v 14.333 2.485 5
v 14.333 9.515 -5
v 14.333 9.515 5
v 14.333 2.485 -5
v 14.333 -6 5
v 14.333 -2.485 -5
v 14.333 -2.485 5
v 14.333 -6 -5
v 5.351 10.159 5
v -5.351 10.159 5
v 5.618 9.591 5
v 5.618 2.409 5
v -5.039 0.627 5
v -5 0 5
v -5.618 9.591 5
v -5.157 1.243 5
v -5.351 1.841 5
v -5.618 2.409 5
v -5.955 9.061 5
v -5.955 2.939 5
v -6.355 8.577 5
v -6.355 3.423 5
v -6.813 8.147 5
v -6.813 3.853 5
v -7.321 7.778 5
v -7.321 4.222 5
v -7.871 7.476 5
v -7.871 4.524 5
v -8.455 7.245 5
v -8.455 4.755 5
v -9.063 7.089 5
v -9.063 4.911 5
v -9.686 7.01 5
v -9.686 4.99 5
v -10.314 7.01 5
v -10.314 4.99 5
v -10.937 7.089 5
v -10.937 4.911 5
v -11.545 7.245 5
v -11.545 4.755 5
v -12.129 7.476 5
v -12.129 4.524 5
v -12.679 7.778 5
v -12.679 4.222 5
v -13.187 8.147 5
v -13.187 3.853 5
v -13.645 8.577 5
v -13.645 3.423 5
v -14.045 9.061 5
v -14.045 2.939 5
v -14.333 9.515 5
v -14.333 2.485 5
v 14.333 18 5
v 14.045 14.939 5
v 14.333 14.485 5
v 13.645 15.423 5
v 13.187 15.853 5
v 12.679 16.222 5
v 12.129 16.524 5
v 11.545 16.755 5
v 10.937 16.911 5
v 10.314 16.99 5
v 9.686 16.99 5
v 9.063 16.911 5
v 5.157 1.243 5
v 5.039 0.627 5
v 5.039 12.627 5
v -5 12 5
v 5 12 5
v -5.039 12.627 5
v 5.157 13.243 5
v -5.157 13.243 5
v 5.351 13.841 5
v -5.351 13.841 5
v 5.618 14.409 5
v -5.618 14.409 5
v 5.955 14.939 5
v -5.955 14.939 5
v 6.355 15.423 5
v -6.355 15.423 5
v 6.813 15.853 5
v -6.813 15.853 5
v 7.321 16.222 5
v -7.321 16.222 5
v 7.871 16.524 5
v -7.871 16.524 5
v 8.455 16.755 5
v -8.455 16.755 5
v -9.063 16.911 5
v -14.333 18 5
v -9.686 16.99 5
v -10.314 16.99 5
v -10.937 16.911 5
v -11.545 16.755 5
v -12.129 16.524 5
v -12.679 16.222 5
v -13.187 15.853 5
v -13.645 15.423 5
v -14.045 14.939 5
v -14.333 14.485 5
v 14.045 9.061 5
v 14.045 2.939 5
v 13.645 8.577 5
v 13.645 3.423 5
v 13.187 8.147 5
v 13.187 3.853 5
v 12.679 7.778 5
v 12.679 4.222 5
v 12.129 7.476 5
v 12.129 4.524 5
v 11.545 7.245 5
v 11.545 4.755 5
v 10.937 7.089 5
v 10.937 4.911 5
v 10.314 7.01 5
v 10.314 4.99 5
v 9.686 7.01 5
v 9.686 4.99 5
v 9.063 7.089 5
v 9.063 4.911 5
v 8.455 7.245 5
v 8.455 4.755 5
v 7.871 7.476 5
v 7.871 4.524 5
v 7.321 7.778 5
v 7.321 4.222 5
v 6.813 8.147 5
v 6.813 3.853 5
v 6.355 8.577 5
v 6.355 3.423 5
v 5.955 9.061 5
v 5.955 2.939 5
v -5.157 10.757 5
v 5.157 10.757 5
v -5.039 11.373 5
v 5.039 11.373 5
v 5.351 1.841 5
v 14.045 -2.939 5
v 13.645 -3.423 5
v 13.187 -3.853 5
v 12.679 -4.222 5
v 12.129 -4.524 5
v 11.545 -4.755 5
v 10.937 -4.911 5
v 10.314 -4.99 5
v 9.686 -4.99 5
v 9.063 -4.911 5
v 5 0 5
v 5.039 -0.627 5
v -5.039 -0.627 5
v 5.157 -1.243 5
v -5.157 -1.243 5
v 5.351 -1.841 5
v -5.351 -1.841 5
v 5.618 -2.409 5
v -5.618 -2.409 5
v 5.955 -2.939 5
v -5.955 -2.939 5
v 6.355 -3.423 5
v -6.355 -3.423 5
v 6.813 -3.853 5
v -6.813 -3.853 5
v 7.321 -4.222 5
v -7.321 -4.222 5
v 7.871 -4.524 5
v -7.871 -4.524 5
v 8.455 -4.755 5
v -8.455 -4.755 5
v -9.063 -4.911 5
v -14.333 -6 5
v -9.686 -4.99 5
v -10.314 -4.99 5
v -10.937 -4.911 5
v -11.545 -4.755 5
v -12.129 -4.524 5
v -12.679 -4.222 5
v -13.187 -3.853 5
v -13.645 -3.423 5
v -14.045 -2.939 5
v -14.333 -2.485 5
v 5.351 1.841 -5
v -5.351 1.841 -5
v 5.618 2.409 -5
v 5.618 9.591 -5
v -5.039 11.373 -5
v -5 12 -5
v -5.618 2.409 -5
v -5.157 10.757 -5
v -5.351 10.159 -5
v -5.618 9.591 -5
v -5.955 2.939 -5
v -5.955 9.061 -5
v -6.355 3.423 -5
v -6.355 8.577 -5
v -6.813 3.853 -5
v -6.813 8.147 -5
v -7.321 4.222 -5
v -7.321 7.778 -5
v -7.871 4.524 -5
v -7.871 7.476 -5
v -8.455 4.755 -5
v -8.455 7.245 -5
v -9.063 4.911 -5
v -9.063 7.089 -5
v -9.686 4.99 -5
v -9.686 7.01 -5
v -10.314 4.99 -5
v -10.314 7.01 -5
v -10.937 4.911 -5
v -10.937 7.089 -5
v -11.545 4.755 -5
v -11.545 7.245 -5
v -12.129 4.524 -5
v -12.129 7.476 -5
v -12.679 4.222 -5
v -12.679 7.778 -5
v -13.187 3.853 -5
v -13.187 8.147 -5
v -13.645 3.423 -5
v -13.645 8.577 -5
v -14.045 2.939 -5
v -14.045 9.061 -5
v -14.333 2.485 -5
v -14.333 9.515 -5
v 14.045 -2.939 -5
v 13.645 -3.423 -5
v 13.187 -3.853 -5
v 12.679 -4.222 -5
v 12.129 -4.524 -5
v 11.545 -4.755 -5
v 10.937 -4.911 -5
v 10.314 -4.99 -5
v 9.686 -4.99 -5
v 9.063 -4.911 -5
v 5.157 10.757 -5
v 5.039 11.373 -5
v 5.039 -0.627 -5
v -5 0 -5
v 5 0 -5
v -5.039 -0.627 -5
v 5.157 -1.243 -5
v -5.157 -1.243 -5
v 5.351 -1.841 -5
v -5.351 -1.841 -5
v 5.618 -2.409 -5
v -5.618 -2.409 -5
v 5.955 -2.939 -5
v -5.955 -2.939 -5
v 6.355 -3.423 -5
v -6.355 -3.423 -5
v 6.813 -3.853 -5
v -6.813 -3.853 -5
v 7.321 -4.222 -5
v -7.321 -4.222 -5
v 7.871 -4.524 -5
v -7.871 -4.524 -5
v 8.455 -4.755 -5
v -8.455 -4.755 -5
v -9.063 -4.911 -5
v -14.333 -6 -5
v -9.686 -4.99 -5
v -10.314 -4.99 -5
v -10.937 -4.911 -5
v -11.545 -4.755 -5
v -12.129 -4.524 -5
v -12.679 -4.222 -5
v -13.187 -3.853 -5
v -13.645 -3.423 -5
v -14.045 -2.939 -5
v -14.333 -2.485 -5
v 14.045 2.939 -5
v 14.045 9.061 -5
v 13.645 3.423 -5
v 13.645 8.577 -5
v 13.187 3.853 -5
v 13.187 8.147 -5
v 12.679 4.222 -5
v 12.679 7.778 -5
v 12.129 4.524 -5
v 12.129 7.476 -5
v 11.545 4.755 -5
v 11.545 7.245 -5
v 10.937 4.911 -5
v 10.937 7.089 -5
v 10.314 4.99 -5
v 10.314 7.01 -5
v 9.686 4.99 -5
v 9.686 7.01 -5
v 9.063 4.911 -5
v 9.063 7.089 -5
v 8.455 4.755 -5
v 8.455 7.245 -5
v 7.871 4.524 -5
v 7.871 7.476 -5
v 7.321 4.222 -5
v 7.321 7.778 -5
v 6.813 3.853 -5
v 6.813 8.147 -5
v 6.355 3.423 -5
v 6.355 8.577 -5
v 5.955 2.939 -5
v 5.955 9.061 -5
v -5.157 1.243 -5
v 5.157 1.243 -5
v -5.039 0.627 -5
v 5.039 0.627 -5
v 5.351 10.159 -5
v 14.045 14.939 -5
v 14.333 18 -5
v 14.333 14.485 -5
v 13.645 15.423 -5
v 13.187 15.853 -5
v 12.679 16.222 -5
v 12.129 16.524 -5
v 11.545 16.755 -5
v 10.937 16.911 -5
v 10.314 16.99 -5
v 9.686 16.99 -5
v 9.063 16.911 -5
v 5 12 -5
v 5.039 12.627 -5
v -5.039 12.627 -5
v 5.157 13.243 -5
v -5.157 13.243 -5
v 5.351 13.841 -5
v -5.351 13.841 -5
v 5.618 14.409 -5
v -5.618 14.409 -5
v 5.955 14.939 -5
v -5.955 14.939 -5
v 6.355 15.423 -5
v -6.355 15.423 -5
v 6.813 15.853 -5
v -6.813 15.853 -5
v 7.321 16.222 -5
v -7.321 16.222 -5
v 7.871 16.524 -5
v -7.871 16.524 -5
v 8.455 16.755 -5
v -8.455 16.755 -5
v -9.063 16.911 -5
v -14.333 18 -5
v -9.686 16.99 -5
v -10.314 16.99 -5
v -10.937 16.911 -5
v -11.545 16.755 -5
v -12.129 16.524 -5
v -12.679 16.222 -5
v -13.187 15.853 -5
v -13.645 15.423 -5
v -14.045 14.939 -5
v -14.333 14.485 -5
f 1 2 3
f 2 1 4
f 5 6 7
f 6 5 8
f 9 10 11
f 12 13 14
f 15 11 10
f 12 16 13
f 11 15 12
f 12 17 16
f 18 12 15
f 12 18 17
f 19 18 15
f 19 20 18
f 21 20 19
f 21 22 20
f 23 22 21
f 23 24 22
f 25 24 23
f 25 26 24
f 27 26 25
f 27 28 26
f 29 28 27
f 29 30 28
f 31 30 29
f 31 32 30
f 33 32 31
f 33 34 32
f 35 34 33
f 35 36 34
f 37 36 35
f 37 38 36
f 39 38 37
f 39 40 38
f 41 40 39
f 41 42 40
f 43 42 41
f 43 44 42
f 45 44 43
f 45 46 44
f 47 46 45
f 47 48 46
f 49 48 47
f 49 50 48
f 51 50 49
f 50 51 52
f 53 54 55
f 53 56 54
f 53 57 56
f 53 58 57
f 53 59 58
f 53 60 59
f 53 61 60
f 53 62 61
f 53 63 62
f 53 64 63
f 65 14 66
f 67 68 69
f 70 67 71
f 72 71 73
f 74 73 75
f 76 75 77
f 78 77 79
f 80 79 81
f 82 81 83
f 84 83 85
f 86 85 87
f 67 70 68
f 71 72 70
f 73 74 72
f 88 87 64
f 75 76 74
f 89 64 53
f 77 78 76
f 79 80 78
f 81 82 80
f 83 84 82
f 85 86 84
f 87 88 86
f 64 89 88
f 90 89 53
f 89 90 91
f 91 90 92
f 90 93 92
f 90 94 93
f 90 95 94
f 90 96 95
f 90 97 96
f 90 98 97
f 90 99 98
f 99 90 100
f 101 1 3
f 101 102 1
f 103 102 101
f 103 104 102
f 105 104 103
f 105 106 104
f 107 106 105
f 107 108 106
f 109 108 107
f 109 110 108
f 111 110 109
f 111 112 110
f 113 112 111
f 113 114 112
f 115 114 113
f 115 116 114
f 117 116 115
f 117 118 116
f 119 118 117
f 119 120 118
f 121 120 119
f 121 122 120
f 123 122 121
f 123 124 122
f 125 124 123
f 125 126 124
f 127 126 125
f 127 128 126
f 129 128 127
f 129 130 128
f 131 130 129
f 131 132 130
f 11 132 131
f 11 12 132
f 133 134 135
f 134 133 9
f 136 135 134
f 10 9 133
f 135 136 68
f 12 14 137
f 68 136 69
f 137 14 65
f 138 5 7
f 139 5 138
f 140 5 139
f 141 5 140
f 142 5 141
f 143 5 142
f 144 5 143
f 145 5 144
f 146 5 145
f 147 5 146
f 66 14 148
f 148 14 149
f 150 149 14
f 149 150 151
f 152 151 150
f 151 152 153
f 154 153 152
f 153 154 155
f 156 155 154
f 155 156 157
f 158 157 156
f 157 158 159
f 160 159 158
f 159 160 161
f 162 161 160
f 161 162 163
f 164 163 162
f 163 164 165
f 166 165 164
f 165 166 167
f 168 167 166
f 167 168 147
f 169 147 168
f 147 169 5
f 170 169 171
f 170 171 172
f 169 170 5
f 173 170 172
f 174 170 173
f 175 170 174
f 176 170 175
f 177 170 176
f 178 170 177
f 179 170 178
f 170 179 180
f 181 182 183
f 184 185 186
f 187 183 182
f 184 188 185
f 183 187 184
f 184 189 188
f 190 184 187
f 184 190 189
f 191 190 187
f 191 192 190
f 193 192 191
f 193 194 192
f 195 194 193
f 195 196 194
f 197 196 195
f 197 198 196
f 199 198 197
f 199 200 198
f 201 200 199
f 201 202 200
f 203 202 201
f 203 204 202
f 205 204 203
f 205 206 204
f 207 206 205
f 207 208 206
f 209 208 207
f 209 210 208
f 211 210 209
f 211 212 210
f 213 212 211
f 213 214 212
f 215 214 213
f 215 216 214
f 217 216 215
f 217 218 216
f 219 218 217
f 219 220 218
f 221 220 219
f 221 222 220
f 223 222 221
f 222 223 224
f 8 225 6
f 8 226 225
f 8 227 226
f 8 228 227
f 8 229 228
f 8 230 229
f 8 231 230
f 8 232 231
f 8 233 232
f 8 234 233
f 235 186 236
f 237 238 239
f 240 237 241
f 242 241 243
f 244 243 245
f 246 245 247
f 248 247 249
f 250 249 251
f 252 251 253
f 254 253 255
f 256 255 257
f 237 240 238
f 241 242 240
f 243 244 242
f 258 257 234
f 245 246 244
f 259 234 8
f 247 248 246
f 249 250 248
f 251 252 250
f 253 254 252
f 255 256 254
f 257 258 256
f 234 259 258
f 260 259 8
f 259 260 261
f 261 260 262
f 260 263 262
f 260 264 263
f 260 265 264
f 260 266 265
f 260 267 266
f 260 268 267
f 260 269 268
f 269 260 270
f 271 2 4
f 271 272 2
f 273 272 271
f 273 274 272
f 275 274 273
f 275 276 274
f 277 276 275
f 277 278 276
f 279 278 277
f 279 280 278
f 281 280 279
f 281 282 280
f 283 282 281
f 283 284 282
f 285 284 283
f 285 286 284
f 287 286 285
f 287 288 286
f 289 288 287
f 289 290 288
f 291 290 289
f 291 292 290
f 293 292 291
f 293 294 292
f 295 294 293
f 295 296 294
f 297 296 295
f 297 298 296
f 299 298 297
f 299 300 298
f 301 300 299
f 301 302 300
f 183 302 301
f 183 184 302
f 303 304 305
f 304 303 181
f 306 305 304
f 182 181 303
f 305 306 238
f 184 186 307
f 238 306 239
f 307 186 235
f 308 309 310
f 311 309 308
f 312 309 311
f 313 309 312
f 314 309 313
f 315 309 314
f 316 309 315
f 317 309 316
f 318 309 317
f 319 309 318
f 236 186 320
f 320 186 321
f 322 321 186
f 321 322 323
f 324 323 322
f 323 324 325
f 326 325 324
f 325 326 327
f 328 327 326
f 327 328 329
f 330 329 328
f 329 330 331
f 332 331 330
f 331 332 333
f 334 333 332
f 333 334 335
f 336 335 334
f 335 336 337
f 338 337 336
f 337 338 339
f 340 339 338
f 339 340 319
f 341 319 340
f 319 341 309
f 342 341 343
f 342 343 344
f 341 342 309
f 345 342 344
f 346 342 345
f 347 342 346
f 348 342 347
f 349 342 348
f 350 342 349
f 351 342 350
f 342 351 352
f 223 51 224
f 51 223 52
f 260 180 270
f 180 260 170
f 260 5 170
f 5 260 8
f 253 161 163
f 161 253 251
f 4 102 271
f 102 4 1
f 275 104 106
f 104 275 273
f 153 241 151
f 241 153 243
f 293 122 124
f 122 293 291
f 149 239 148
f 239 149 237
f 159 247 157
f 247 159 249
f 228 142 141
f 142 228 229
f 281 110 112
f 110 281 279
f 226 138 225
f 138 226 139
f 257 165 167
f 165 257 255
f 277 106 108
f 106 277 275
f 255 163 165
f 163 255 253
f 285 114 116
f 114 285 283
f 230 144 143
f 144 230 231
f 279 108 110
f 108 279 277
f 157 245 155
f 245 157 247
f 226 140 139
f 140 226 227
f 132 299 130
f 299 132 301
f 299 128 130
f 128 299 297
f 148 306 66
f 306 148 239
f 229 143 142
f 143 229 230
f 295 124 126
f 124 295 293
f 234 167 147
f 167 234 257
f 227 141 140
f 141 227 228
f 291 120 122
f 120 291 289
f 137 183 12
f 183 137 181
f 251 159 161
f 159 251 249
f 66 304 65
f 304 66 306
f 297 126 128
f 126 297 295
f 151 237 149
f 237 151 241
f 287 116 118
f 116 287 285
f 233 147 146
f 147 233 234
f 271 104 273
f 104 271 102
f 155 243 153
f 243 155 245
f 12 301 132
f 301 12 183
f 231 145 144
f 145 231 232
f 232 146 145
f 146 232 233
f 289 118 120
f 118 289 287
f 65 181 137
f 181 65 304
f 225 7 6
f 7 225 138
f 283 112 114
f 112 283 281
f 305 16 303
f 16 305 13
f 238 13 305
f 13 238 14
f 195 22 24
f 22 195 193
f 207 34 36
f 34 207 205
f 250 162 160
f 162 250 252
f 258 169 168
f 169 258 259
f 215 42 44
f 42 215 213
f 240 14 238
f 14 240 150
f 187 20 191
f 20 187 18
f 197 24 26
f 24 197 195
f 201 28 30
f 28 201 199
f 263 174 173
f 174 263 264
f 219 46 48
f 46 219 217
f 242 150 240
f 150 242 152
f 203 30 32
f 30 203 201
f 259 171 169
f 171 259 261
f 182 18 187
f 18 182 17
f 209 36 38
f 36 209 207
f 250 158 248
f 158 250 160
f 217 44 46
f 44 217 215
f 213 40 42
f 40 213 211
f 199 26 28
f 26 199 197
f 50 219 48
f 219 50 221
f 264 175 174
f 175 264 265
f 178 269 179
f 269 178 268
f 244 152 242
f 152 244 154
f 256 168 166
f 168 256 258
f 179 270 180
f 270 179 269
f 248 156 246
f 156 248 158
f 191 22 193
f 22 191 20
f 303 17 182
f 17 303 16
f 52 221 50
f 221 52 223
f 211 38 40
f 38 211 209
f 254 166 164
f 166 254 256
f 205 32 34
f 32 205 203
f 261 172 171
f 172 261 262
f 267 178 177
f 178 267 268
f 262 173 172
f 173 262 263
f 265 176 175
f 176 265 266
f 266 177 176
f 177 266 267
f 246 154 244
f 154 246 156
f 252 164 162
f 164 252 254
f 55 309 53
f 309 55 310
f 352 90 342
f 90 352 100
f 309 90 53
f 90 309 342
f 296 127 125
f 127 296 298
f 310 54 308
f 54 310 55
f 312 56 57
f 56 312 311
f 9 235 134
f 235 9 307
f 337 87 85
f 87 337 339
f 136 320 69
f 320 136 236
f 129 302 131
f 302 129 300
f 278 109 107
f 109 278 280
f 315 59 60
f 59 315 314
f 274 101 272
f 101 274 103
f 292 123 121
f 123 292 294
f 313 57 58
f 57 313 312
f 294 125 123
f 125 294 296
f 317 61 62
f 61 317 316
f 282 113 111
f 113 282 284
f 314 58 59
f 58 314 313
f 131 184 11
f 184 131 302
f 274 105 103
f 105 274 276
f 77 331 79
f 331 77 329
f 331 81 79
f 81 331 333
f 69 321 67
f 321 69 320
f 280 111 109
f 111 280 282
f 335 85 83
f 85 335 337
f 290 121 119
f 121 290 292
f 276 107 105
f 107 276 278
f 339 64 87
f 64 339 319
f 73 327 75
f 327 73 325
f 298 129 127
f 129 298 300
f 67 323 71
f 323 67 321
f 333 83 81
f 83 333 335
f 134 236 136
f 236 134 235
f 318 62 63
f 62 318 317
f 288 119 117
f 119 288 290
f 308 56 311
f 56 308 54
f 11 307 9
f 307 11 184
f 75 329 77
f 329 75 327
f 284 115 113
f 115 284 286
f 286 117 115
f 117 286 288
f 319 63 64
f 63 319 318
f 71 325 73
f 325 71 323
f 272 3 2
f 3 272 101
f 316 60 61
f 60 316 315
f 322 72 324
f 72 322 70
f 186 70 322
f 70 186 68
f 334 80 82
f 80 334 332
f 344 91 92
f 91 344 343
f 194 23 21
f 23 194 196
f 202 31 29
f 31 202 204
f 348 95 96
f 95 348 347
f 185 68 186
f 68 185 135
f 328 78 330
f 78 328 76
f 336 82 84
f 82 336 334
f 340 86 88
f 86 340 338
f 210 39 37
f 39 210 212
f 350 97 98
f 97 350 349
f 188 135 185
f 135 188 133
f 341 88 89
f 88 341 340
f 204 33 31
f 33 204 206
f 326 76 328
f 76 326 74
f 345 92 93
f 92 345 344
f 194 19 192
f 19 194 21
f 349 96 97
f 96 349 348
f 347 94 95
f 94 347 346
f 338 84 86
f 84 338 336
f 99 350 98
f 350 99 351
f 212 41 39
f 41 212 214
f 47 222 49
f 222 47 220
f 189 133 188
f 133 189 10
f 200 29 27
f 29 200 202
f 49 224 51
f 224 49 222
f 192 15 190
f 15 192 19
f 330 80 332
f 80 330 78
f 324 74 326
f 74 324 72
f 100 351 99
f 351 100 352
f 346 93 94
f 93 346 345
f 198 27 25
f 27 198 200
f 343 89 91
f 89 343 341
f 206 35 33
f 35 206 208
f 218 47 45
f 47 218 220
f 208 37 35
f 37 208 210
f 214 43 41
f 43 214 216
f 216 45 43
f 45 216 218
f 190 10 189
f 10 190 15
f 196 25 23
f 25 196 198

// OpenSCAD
//the stregth of the grabber(play around with it!) Higher values, the stronger is the connection
Grabber_strength = 1.5;
// Length of the holder in mm
Length = 10;
// Diameter of the cable in mm
Diameter_of_the_cable = 10;
// Thickness ofthe plasti in mm(2 mm is a good value)
Plastic_thickness = 2;
// Number of cables you have(it must be a round number not a 5,7 and so on). Just round it up!
Number_of_cables = 4;
for (i = [0 : abs(1) : Number_of_cables / 2 - 1]) {
  translate([0, ((Diameter_of_the_cable + Plastic_thickness) * i), 0]){
    difference() {
      cube([((Diameter_of_the_cable * 2 + Plastic_thickness) + Diameter_of_the_cable / Grabber_strength), (Diameter_of_the_cable + Plastic_thickness), Length], center=true);

      translate([Diameter_of_the_cable, 0, 0]){
        {
          $fn=50;    //set sides to 50
          cylinder(r1=(Diameter_of_the_cable / 2), r2=(Diameter_of_the_cable / 2), h=10, center=true);
        }
      }
      translate([(Diameter_of_the_cable * -1), 0, 0]){
        {
          $fn=50;    //set sides to 50
          cylinder(r1=(Diameter_of_the_cable / 2), r2=(Diameter_of_the_cable / 2), h=10, center=true);
        }
      }
    }
  }
}
